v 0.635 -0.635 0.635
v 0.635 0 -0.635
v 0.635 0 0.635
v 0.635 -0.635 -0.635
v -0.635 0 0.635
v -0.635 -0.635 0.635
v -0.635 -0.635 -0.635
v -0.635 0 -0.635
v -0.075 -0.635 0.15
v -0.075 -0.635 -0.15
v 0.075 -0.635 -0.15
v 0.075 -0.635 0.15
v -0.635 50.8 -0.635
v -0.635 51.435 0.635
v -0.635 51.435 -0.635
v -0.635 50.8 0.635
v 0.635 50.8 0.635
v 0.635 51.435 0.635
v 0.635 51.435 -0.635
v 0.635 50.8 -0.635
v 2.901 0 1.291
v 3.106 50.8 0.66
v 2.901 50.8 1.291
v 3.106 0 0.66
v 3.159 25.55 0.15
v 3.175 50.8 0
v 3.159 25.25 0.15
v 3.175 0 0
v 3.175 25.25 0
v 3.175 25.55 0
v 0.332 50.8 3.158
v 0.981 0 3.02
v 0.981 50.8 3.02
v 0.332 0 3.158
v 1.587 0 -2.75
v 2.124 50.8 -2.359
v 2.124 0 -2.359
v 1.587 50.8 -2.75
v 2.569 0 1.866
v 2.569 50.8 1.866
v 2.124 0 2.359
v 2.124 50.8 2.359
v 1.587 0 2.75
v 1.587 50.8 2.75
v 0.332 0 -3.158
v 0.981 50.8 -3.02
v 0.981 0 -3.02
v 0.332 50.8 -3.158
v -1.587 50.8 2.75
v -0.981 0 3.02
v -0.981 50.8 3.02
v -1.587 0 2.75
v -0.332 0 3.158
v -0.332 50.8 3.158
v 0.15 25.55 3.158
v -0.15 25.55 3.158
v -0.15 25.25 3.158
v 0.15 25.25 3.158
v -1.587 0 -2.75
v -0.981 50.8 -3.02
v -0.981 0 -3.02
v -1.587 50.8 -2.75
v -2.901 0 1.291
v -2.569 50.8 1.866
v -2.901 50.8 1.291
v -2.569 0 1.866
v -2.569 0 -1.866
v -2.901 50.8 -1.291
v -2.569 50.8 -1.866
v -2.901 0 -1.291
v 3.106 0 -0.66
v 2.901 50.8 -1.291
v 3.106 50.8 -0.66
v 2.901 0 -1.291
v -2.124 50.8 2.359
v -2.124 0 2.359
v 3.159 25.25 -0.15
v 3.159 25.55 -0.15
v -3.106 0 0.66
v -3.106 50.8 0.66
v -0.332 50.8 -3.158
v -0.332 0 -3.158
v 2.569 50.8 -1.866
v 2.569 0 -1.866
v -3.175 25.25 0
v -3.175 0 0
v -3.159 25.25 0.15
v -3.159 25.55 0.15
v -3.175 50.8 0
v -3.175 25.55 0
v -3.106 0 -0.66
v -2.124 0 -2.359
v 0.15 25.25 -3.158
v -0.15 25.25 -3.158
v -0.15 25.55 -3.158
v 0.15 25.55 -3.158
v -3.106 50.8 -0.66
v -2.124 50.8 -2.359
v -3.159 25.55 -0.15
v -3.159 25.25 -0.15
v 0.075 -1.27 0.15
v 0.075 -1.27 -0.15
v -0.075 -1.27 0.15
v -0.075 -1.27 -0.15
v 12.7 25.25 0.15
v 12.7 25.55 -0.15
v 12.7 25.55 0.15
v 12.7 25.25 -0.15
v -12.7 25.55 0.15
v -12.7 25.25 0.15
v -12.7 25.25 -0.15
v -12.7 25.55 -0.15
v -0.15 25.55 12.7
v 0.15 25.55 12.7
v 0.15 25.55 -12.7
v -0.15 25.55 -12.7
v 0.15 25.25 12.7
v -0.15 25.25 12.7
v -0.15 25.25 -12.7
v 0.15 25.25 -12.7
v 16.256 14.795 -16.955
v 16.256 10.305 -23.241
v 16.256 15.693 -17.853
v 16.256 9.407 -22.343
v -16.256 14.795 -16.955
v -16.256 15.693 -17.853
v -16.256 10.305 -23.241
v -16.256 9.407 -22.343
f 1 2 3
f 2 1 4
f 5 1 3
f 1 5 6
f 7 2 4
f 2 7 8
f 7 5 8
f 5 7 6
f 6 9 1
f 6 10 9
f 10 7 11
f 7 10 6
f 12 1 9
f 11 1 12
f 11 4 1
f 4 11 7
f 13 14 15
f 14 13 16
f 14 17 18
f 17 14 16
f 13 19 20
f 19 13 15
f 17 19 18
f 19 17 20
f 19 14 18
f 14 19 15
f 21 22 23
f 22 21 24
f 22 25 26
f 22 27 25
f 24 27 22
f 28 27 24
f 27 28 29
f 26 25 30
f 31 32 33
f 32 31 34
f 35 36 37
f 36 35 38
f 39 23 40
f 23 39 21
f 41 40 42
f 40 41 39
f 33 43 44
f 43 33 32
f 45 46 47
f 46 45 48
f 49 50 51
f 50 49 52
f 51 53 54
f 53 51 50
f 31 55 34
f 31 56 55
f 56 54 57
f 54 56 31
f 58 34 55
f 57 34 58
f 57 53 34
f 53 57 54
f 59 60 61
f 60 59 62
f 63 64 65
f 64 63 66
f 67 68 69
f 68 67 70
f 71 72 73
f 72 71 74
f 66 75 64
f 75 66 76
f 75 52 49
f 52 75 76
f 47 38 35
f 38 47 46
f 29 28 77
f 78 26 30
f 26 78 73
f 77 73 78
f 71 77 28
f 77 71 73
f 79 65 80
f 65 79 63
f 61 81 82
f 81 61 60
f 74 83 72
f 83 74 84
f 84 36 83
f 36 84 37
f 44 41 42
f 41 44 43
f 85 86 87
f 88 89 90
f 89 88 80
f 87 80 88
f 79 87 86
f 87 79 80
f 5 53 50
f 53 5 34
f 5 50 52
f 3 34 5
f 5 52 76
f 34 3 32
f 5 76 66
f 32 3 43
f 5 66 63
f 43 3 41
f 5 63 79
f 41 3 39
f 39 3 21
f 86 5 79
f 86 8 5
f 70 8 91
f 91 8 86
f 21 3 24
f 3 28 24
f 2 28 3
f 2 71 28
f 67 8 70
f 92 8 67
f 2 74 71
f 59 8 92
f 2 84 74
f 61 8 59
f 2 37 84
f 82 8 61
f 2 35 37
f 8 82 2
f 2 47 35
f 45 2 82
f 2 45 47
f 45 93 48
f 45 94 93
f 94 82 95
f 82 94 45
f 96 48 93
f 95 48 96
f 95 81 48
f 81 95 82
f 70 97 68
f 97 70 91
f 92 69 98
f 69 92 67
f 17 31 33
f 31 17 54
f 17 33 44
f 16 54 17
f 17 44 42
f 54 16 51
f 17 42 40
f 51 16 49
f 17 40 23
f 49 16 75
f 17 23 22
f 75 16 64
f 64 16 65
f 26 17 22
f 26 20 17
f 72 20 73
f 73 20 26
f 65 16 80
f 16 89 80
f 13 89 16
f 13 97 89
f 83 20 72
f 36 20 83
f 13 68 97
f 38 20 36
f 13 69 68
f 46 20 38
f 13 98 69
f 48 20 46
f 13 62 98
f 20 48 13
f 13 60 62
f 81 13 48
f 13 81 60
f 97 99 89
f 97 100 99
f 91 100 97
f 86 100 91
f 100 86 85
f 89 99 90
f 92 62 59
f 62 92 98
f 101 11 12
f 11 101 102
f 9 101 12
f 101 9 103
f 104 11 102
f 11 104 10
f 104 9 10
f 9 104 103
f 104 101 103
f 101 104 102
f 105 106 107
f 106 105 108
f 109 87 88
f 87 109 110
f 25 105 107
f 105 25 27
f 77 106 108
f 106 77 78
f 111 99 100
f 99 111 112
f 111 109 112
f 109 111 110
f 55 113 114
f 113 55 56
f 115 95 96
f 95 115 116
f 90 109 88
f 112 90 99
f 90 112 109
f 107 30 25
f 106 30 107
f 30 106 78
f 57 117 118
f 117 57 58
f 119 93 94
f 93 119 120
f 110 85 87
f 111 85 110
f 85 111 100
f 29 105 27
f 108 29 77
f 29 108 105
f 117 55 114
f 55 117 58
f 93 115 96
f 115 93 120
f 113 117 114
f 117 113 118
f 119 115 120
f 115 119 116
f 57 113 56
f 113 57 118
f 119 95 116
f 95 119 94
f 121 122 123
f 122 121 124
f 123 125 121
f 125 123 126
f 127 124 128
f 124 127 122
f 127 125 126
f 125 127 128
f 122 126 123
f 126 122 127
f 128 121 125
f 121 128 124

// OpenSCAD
include <../mo/mo.scad>

module shaftBuild( l, d, id, caps ) {
  color( Stainless ) {
    rotate( [90,0,0] )
      difference() {
        cylinder( h = l, r = d/2, center = true  );
        if ( id > 0 ) 
        cylinder( h = l + 2 * Epsilon, r = id/2, center = true  );
      }
    if ( caps == true ) {
      translate( [ 0, l/2, 0 ] )
        sphere( r = d/2  );
      translate( [ 0, -l/2, 0 ] )
        sphere( r = d/2 );
    }
  }
}

function moShaftPosition( p = 0, l = 1 * in ) = [   
  [
    0,
    ( ( p == 0 ) || ( p == 3 ) ) ? 0 : ( ( p == 1 ) ? -l/2 : l/2 ),
    0        
  ],
  [
    0,
    0,
    1,
  ],
  ( p==2 ) ? 180 : 0
];

module moShaft( p = 0, l = 1 * in, d = 0.25 * in, id = 0, caps = false, info = false ) {
  moMoveOriginTo( moShaftPosition( p, l ) ) 
  {
    shaftBuild( l, d, id, caps );
    if ( info == true ) {
      for ( i = [ 0 : 2 ] ) {
        moMoveTo( moShaftPosition( i, l ) )
          moPosition( i );
       }
    }
  }
  if ( info == true )
    moPartOrigin();
  if ( $name )
    moPartLabel( parent_module( 1 ) );
}

// Make  shaft - centered
moMoveOriginTo( moShaftPosition( 1, 2 * in ) )
  moShaft( 0, l = 2*in, d = 0.25*in, caps = false, info = true, $name = true );
